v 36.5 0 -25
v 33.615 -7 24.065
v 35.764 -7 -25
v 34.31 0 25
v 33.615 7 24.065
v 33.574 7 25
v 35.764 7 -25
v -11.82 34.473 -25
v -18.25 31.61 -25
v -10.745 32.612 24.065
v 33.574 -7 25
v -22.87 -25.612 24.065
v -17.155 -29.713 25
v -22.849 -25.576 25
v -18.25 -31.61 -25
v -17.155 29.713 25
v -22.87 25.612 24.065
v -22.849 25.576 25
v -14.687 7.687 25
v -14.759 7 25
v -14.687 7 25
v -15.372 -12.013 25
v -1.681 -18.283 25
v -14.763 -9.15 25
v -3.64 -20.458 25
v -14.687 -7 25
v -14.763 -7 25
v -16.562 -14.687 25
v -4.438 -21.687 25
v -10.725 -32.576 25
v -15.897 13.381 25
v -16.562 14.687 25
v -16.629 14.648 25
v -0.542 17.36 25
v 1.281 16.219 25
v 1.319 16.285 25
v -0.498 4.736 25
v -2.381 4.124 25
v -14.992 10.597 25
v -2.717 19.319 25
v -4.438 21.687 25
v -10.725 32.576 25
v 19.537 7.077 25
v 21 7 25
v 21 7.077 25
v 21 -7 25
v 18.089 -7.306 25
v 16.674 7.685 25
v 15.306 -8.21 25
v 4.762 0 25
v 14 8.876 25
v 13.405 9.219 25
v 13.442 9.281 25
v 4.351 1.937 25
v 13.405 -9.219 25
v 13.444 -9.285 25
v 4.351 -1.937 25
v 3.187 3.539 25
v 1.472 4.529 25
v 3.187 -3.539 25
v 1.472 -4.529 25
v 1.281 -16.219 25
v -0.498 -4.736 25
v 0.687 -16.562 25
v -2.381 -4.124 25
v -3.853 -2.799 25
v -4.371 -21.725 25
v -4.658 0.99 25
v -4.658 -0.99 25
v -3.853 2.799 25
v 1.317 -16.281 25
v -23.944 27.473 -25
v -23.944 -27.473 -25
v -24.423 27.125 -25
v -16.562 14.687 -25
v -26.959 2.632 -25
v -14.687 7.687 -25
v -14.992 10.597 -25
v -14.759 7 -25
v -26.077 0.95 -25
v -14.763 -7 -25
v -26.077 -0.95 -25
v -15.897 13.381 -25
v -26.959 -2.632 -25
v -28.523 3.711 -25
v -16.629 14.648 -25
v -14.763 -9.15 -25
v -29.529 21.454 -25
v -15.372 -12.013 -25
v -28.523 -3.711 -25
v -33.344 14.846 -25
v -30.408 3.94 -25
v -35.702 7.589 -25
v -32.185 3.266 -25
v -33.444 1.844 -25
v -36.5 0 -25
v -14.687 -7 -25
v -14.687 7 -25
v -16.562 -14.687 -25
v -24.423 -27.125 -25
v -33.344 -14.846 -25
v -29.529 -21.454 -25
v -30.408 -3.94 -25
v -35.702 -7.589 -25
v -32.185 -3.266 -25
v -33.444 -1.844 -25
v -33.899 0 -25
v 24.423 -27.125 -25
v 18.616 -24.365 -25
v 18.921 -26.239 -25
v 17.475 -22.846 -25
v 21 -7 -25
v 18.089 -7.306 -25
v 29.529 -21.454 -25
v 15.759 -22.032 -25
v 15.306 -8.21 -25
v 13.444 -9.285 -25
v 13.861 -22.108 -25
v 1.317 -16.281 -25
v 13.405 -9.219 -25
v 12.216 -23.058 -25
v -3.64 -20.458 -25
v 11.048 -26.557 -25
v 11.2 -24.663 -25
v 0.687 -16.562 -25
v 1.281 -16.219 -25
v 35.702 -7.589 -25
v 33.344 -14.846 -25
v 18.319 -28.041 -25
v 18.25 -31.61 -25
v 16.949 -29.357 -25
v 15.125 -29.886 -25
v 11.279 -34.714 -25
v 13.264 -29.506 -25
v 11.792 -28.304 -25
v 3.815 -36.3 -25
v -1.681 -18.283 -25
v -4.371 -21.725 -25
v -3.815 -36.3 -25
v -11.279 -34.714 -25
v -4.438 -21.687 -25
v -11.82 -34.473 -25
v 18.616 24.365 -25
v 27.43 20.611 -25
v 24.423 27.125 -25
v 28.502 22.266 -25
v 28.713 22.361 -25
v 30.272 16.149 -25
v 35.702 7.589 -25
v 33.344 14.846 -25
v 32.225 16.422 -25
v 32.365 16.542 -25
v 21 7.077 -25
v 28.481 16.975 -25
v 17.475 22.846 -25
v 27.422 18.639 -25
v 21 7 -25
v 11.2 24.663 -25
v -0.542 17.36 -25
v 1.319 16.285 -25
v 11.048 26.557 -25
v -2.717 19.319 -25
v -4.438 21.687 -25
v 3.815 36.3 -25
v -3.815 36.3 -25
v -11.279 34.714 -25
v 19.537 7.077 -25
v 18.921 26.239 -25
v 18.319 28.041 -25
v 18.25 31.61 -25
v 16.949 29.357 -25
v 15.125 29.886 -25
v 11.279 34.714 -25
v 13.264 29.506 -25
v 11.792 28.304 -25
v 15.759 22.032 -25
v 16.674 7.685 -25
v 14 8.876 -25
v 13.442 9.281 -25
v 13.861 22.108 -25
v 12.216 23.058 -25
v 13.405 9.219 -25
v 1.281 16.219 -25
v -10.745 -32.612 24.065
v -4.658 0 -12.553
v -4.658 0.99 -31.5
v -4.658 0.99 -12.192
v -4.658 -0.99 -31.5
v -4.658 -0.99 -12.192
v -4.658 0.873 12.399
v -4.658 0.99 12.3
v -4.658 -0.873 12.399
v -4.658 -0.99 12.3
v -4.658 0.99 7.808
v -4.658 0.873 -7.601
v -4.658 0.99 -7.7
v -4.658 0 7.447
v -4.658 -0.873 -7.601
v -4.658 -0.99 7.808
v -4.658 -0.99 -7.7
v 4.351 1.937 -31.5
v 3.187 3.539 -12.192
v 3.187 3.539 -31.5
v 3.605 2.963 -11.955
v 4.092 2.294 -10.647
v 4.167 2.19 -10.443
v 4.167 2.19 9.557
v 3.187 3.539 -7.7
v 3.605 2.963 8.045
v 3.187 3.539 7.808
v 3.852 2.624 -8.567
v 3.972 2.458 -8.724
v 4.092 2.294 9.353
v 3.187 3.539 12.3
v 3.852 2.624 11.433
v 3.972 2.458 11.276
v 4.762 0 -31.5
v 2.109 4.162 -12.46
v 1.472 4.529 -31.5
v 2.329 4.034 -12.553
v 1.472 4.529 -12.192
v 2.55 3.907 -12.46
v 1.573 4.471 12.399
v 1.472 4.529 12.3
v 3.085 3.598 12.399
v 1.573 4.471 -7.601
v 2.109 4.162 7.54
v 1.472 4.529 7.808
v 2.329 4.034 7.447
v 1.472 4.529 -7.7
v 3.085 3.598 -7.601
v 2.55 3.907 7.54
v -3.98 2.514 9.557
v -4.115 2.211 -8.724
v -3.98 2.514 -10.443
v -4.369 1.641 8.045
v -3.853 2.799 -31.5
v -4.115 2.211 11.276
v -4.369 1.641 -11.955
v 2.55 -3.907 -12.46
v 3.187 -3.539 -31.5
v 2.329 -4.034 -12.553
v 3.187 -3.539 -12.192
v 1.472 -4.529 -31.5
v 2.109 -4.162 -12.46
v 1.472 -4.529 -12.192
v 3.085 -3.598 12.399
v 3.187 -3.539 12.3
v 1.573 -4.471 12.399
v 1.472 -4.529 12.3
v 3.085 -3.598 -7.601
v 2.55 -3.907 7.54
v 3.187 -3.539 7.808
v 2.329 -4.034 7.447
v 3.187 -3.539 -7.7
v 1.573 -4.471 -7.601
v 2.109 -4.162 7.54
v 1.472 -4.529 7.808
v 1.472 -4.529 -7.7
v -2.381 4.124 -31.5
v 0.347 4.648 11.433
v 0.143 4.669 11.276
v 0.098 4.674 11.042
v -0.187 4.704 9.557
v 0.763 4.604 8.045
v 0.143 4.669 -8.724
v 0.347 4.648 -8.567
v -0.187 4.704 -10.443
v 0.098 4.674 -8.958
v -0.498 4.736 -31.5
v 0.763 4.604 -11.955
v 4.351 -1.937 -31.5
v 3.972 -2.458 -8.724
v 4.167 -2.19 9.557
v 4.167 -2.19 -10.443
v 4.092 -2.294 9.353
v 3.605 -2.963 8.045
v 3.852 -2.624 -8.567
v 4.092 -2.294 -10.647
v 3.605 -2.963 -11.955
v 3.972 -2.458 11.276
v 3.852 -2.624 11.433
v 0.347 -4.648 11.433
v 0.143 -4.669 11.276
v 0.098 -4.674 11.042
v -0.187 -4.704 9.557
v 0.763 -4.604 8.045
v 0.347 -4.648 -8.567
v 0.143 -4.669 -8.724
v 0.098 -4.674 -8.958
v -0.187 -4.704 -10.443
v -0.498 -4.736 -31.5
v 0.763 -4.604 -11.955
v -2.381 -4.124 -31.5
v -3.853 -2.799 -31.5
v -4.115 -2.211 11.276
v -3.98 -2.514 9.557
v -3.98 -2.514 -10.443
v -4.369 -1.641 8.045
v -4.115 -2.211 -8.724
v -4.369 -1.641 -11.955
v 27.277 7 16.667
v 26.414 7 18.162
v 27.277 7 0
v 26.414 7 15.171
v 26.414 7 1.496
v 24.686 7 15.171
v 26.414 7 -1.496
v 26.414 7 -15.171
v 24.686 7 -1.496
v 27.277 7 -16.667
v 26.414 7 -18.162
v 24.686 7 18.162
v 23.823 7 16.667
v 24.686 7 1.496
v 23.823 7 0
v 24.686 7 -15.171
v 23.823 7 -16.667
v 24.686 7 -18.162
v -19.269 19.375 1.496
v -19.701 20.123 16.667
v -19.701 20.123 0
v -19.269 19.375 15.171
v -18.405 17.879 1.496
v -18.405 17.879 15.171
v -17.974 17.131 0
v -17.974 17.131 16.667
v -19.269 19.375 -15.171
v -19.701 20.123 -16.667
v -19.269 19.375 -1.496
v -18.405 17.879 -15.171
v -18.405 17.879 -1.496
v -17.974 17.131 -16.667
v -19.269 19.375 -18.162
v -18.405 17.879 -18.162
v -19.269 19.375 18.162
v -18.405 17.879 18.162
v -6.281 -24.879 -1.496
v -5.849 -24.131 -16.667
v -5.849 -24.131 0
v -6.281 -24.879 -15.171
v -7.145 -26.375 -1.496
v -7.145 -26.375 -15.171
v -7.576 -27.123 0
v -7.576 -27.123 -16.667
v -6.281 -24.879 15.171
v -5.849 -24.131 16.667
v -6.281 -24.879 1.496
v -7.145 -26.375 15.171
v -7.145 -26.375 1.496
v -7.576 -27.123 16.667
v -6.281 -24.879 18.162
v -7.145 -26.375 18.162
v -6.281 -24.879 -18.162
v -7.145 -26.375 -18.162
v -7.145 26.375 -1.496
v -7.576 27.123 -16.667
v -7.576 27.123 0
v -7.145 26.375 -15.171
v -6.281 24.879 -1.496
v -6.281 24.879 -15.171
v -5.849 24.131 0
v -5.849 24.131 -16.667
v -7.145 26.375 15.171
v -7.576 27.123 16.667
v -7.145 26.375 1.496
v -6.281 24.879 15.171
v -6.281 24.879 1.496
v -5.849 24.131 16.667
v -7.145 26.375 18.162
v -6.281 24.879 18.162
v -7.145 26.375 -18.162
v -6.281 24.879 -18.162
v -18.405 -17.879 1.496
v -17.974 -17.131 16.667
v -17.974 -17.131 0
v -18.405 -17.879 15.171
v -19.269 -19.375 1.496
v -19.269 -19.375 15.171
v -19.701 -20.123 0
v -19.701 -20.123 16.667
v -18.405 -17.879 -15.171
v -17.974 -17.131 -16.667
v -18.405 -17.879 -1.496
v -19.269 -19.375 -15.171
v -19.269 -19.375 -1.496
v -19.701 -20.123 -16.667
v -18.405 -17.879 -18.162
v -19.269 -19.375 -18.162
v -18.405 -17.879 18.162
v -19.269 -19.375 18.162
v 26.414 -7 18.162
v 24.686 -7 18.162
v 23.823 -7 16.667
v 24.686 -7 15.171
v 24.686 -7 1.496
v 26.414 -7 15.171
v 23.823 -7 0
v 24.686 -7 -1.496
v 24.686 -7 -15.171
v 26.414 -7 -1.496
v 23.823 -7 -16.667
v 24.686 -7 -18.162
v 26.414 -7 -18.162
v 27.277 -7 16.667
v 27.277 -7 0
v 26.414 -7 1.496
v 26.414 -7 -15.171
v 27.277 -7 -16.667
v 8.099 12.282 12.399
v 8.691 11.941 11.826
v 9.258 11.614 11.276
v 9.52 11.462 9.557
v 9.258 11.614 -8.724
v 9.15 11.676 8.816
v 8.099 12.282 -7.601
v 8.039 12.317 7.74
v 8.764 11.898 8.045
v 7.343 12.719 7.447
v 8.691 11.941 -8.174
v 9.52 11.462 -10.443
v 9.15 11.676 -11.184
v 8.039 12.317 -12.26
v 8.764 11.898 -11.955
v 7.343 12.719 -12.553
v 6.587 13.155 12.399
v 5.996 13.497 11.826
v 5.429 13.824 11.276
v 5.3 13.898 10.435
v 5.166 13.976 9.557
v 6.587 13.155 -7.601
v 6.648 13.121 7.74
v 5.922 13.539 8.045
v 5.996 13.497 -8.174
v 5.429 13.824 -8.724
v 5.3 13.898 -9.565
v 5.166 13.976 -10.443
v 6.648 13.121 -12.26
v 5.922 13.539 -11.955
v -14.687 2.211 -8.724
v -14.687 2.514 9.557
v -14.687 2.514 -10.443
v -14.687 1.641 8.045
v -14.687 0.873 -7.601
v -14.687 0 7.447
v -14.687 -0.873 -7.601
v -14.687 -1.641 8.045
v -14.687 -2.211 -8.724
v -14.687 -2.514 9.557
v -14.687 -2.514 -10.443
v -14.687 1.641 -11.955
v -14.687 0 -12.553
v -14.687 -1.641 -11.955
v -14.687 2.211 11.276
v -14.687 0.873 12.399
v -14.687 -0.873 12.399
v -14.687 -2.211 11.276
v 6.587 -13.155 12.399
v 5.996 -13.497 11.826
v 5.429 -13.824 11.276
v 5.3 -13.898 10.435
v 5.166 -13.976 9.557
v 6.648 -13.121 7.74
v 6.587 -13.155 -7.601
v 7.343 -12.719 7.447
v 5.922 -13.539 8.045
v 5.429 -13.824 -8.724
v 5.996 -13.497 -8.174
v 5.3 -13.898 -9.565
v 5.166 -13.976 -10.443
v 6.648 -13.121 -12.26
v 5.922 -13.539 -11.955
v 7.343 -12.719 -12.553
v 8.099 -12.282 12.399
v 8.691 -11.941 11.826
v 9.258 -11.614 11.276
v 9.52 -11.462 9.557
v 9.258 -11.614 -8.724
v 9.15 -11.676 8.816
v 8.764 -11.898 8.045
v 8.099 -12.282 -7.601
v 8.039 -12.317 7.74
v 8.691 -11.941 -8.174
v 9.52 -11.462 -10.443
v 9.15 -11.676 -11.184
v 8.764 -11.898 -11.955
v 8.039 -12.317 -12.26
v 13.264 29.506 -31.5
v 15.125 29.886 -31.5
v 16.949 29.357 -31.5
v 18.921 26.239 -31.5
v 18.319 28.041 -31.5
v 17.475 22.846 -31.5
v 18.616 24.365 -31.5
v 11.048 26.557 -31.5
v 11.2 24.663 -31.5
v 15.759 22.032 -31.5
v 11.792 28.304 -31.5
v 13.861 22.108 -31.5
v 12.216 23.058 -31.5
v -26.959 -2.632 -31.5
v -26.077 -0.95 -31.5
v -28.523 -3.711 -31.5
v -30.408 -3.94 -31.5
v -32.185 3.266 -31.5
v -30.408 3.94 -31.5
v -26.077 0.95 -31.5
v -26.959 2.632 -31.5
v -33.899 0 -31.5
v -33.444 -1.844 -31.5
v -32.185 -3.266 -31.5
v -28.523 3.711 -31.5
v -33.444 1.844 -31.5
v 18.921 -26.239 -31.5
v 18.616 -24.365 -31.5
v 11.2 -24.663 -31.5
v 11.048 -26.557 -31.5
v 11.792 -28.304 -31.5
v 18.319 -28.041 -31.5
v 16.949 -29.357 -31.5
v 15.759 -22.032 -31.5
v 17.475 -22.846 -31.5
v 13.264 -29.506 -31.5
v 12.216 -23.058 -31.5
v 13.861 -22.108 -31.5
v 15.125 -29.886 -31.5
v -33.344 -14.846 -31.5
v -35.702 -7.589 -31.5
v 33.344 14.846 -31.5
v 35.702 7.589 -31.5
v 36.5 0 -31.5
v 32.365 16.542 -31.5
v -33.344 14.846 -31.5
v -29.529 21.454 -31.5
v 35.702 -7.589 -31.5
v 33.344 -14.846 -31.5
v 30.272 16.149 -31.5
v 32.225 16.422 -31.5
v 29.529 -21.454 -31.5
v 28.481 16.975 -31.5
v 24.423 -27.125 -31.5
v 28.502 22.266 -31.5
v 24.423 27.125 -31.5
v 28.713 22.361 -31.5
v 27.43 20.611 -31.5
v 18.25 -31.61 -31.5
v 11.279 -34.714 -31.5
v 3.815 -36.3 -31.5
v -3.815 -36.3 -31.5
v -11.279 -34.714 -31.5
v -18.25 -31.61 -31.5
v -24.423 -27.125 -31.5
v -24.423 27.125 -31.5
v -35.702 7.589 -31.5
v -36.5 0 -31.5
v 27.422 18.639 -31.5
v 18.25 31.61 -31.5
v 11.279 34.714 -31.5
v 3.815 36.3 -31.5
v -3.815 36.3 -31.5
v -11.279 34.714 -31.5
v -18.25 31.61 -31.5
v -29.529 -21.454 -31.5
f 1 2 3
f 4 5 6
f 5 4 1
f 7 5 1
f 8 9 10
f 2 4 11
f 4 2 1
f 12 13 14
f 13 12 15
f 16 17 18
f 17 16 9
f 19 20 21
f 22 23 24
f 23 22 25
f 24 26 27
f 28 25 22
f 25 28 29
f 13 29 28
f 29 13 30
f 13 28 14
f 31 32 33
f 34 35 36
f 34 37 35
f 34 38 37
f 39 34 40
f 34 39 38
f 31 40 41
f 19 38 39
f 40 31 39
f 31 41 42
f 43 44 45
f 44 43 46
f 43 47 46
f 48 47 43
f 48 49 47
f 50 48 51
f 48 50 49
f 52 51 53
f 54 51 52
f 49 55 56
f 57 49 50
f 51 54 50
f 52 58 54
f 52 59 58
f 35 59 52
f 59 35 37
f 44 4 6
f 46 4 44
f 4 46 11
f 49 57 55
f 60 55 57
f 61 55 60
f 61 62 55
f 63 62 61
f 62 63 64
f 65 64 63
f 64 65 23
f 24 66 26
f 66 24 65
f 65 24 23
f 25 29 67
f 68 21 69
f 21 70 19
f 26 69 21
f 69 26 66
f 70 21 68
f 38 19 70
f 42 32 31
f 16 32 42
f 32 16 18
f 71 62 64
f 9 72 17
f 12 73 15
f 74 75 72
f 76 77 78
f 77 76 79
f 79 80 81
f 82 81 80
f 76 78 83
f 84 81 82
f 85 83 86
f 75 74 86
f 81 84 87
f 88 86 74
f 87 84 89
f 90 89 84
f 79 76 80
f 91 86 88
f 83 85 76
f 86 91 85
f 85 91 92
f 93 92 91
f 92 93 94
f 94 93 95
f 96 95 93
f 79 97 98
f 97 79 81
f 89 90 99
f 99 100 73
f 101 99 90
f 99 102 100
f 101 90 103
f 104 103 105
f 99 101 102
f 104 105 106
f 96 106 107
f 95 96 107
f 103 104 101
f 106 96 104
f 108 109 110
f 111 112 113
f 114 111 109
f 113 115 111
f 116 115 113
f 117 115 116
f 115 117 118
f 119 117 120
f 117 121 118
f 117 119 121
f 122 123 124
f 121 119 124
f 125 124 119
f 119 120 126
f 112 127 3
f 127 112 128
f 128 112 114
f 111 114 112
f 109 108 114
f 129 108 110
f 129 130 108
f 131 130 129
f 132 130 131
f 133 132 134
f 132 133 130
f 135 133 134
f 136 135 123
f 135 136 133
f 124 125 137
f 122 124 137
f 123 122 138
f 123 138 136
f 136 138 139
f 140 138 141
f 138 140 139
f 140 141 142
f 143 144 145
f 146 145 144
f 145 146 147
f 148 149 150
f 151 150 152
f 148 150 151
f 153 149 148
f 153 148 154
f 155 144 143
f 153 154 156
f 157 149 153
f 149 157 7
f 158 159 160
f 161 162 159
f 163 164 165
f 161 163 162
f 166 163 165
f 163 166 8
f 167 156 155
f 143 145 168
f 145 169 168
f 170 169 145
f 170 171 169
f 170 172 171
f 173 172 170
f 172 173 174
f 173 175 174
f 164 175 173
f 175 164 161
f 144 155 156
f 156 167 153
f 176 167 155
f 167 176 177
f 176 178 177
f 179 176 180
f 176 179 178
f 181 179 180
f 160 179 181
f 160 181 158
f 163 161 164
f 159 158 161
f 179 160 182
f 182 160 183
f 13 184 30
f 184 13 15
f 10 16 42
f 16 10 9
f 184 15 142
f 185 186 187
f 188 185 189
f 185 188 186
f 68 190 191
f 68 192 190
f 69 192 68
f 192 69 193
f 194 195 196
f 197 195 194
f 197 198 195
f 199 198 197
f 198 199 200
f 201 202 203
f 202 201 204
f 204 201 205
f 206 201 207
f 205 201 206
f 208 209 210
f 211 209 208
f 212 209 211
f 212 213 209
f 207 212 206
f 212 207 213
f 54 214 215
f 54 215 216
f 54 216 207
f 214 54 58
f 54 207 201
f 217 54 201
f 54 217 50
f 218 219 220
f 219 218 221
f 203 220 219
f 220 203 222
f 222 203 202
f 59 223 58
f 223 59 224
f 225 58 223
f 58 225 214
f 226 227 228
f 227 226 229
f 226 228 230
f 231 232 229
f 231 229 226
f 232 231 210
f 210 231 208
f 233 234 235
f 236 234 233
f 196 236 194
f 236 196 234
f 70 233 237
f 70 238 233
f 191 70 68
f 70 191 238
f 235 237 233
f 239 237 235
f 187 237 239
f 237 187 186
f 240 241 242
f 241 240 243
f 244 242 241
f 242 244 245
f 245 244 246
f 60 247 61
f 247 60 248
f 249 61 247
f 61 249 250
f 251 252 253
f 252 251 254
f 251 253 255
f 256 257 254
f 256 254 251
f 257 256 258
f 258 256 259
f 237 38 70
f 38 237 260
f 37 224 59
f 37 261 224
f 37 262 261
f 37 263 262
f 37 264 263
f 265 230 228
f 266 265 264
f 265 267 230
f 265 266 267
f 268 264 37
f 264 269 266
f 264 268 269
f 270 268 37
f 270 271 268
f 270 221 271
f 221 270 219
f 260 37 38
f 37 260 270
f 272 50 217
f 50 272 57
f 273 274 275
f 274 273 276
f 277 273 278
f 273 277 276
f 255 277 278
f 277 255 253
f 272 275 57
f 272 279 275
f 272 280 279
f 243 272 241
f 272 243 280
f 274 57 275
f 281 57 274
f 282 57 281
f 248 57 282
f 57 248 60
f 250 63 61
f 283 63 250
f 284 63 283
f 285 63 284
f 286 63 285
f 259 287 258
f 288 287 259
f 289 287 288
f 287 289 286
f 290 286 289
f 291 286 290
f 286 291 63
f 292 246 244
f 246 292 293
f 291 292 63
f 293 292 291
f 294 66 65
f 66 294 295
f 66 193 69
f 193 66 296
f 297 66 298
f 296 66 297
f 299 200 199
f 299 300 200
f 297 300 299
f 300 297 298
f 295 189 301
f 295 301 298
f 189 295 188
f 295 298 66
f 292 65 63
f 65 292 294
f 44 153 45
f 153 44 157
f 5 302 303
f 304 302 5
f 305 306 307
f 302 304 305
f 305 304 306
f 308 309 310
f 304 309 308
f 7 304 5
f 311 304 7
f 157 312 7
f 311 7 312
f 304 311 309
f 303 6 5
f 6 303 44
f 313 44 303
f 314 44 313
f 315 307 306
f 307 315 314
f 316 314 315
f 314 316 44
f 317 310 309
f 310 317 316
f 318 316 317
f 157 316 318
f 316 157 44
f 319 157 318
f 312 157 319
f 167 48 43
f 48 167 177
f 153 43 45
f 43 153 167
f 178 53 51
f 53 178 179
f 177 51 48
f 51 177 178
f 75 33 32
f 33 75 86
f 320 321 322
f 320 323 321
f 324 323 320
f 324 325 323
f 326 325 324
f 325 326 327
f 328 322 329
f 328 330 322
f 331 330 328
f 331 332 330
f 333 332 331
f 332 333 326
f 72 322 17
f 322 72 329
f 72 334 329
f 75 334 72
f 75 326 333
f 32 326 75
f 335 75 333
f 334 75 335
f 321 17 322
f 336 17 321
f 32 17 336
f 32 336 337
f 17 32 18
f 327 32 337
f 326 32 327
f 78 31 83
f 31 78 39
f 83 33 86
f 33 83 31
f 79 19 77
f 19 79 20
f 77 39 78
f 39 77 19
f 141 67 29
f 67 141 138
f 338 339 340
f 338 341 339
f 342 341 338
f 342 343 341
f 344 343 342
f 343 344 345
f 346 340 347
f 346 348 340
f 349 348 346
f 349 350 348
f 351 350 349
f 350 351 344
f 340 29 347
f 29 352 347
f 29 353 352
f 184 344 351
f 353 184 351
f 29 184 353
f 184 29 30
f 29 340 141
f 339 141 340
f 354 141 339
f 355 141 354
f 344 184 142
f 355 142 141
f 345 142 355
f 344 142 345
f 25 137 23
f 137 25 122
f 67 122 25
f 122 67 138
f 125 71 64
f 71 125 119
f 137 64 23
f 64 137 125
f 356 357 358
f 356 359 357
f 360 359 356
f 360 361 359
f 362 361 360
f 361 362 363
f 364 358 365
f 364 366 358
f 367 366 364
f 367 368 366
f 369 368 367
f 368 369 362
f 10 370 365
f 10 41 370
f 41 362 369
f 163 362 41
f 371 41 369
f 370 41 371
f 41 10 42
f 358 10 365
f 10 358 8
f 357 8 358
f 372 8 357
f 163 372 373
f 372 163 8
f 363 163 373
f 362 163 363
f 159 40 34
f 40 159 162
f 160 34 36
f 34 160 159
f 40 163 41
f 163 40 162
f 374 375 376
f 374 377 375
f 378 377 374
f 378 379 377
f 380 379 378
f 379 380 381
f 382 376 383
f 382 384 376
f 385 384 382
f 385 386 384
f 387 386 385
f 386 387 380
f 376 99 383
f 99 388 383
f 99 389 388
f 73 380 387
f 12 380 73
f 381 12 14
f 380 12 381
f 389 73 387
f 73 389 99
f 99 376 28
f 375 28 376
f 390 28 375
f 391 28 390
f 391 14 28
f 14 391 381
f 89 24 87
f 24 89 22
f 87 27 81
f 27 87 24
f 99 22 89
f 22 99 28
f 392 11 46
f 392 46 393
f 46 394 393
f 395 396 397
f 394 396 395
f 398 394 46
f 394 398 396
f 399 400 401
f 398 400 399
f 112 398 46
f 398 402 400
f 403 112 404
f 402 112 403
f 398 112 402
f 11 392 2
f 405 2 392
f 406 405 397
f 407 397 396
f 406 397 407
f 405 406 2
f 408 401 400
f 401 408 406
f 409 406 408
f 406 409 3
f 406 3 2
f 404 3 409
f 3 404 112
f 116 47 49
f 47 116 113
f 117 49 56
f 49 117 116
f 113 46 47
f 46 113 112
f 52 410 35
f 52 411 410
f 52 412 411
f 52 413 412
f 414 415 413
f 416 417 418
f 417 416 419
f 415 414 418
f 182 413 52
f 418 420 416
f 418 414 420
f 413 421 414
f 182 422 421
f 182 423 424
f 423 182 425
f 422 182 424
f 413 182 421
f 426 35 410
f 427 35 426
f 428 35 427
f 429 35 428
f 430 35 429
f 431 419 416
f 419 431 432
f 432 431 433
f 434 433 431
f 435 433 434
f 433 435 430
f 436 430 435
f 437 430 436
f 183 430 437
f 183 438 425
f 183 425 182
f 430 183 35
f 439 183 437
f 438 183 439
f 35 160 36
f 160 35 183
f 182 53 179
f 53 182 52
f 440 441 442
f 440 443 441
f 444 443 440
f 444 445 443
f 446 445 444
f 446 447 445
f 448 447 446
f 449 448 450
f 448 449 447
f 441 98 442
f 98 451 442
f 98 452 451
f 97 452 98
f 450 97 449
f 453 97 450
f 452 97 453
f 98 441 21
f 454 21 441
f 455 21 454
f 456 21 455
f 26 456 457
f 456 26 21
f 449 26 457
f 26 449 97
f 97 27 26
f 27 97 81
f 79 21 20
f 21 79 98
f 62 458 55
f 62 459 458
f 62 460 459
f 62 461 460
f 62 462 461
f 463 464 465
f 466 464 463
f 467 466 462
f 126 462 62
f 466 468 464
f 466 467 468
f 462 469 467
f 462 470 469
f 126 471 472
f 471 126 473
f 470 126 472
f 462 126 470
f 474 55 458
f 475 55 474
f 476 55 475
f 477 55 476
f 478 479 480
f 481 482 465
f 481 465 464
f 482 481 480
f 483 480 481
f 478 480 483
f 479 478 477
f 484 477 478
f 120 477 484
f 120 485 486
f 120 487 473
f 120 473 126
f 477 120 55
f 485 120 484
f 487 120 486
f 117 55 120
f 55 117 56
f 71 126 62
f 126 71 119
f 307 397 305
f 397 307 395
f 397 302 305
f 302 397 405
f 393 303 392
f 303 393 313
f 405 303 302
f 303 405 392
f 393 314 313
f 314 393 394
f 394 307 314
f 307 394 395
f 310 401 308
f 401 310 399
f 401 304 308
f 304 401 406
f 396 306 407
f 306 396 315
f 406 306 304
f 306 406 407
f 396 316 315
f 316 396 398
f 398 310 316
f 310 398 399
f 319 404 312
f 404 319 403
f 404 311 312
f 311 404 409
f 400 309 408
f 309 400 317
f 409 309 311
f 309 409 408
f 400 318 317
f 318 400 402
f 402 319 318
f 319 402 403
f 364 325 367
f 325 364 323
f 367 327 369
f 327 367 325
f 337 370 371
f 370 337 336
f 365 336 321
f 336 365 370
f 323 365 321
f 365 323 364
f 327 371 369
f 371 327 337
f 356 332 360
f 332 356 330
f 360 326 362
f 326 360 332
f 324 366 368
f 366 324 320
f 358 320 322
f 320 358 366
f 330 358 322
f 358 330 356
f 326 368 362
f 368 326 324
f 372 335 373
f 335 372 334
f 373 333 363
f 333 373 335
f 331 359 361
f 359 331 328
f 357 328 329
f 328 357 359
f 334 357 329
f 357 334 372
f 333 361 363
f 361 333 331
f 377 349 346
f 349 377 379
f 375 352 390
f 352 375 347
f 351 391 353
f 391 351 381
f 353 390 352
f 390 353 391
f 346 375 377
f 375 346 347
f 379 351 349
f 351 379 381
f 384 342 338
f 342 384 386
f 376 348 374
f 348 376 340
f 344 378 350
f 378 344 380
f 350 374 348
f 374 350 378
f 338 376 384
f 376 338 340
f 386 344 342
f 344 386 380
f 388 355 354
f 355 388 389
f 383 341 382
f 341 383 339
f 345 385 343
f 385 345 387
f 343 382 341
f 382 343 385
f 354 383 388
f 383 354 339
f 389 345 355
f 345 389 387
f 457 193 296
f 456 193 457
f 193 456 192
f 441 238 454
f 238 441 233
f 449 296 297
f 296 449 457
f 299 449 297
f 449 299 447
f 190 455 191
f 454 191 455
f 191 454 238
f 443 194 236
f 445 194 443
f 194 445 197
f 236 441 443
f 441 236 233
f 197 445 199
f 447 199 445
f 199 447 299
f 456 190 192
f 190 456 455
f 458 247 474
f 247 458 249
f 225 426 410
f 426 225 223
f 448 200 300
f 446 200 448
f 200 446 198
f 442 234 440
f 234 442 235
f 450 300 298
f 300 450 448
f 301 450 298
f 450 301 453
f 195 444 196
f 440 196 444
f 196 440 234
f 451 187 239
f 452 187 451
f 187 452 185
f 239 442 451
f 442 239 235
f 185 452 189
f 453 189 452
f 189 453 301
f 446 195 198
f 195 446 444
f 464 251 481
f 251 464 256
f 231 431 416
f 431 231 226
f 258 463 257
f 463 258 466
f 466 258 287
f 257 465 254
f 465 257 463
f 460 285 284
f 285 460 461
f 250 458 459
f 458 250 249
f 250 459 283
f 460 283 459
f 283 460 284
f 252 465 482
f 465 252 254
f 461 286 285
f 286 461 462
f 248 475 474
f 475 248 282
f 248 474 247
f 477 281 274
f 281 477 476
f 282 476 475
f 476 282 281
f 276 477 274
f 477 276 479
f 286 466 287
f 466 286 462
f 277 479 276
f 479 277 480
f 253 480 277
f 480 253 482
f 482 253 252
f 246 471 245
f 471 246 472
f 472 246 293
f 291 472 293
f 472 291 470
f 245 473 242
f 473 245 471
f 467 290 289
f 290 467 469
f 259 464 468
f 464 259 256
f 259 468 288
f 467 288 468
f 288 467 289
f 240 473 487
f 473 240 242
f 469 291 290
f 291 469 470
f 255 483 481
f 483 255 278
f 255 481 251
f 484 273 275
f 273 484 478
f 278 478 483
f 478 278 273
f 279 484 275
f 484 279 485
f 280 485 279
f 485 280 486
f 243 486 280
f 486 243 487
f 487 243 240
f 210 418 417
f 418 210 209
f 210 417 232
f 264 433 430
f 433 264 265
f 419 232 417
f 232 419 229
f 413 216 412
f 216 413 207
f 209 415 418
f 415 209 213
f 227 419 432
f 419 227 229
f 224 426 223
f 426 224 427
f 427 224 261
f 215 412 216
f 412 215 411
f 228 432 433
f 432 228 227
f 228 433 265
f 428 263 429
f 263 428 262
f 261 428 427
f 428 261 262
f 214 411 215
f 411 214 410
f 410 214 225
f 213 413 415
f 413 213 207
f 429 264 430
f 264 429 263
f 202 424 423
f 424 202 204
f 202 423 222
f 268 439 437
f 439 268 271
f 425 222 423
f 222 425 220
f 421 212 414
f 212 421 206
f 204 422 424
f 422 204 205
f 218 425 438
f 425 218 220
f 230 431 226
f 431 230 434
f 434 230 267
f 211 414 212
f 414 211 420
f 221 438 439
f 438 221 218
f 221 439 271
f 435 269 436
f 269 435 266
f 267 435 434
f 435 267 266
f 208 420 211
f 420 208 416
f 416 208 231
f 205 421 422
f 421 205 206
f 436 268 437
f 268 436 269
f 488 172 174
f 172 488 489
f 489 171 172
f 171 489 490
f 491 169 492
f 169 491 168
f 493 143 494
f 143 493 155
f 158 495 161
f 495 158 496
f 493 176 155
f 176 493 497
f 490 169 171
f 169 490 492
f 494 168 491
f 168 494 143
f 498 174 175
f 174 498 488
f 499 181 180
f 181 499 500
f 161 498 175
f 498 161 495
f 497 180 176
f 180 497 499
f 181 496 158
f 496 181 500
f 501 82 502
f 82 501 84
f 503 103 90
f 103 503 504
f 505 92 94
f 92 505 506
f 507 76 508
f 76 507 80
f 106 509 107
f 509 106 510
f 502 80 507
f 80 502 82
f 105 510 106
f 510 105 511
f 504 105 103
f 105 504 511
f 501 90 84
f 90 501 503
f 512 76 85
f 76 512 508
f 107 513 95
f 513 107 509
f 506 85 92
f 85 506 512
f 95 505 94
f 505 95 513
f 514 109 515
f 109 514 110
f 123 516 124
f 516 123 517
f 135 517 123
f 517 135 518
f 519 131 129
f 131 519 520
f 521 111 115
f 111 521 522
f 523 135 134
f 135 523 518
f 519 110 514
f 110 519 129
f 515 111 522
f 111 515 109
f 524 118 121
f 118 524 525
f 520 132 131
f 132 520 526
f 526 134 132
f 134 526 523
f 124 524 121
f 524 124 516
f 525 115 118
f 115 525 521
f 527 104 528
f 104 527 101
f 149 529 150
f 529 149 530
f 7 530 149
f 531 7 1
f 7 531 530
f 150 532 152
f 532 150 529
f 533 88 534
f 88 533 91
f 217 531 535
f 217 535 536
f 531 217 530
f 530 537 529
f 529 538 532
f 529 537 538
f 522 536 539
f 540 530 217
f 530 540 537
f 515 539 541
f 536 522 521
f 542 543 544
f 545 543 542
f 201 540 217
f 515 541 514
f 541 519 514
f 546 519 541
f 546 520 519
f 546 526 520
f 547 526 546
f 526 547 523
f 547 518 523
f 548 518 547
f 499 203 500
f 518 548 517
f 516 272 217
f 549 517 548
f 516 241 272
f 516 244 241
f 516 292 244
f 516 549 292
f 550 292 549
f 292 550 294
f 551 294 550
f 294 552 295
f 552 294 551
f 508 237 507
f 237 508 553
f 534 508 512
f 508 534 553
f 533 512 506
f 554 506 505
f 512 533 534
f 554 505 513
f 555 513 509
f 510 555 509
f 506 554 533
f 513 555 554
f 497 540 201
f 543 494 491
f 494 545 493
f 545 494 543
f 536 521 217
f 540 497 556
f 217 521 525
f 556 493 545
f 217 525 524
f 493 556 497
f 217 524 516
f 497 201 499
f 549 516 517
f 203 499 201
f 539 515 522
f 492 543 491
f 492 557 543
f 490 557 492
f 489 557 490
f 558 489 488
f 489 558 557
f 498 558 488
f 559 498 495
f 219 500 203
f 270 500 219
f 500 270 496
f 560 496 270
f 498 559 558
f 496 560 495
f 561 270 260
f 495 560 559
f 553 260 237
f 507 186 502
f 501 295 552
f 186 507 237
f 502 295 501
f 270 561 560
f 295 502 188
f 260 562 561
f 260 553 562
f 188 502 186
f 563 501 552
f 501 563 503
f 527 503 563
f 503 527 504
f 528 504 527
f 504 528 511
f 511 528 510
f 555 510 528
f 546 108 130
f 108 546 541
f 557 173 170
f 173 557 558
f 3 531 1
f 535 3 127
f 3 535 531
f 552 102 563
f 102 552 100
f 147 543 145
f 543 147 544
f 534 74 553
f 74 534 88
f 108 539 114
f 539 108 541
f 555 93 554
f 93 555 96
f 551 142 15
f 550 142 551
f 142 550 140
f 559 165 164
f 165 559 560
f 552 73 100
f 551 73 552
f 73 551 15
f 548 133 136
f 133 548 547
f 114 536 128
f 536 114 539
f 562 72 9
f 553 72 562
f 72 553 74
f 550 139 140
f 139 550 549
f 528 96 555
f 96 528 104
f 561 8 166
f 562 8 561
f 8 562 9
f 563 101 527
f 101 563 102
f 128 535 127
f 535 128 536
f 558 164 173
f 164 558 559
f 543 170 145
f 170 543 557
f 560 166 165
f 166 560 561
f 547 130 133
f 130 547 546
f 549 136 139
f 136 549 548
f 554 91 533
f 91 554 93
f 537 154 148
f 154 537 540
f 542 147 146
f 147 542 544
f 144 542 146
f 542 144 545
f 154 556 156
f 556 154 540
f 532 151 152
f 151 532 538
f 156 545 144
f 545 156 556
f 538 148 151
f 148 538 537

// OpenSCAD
// Base for Spider by 
// 12/14/2020
// Visit erellaz.com for additional documentation and workflow

scale=25.4;    // Inch to mm

//Main disk
dm=73; //External diameter mm
dc=35;
hm=50; //heigth  mm
conification=.94;//percentage of conification, making the top smaller than the base

//central hole
dh=(3/8)*(scale);//=9.5; //diameter hole for 3/8" screw, not tapped

// Notch
dnotch=7; //diameter notch in mm
rnotch=32.5; //positional angle of notch in degree


//holes for vanes
rlh=.1360*scale/2; //drill at .1360 to tap for 8-32 screws
//rlh=((0.089)*(scale))/2; //for 4-40 tap, drill at 0.089", closest fractional 3/32"=0.094"
nbrholes=3;
echo(rlh);
hlh=50; //height of assembly in mm
percvaneholes=.70;

//filet
fi=14; //this value in mm should be greater than vane_spacing

//spacing between 2 parallel vanes
vane_spacing=14; //we need to allo for 2 1/4" screws, so a little over 1/2 thickness, ie over 12.7mm
x=vane_spacing/2;


// The base
hb=6.5; //thickness of base mm
cs=3; //number of collimation screws, should be 3 or 4
rot=60; //rotation factor in degree
perc=.82; //percentage of the diameter to place the collimation holes
rlhb=(5/16)*(scale)/2;//7.9/2; //The holes in the base, 5/16", not tapped

//hole to axis
//holes
rha=.2010*scale/2;//for 1/4-20 tap, drill at 0.2010", closest fractional 13/64"


//Resolution for STL export only. That is for display in Openscad and 3D printing only. 
//Please do comment this before going to Freecad, or you will end up with inefficient facets.
// and will not play well with export to .step files
//$fn=250;

//_________________________________________________________________________________
//main body
module body(hm,dm){
difference(){
cylinder(h=hm, r1=.5*dm,r2=.5*conification*dm, center=true); //the body
//cube(size = [dm, dm, hm], center = true);
cylinder(h=hm+20, d=dh, center=true); //the hole
}
}

//The 3 cut outs of the main body
module cutter(dm,hm){
 for(i = [0 : 120 : 360]){
     //rotate([0,0,i]) translate([dm/6,0,-hm]) cube(size = [dm, dm, hm*2], center = false);
    rotate([0,0,i]) union(){
    translate([x,x+fi,-hm]) cube(size = [dm, dm, hm*2], center = false);
    translate([x+fi,x,-hm]) cube(size = [dm, dm, hm*2], center = false);
    translate([x+fi,x+fi,0]) cylinder(h=hm*2, r=fi, center=true);
    }
}

for(i = [30 : 120 : 390]){
     //rotate([0,0,i]) translate([dm/6,0,-hm]) cube(size = [dm, dm, hm*2], center = false);
    rotate([0,0,i]) union(){
    translate([x,x+fi,-hm]) cube(size = [dm, dm, hm*2], center = false);
    translate([x+fi,x,-hm]) cube(size = [dm, dm, hm*2], center = false);
    translate([x+fi,x+fi,0]) cylinder(h=hm*2, r=fi, center=true);
    }
}
// The following formula deserves a bit of explanation:
// the cylinders have their center on a circle of radius sqrt(2)*(x+fi)
// and 2 adjacent cylinders are 30 degrees apart
// hence the flat part should be at cos(15)*sqrt(2)*(x+fi)
for(i = [0 : 120 : 360]){
    rotate([0,0,i+60])translate([cos(15)*sqrt(2)*(x+fi),0,0])cube(size = [2*fi, fi, 1.2*hm], center = true);
}

}


//the holes to mount the vanes
module drill_holes(dm,hm,hlh,rlh){
   spacing=hm/(nbrholes*2);
    for(i = [0 : 120 : 360]){
    for(j = [0 : 1 : nbrholes-1]){
     rotate([0,0,i])  translate([percvaneholes*dm/2,0,(nbrholes-1-2*j)*spacing]) rotate([90,0,0]) cylinder(h=hlh, r=rlh, center=true);
    }
}
}

//the holes to the axis
module drill_holes_to_axis(hm,rha){
    for(i = [0 : 120 : 360]){
    rotate([0,0,i]) translate([-15,0,hm/5]) rotate([0,90,0]) cylinder(h=30, r=rha, center=true);
    rotate([0,0,i]) translate([-15,0,-hm/5]) rotate([0,90,0]) cylinder(h=30, r=rha, center=true);
    }
}

// The base for colimation screws
module collimation_base(hb,hm,dm,dh,rlh){
    difference(){
        translate([0,0,-(hb+hm)/2])cylinder(h=hb, d=dm, center=true);  //base body
        cylinder(h=hm+20, d=dh, center=true); //the hole
        for(i = [0 : 360/cs : 360]){ //the holes for collimation screw
         rotate([0,0,i+rot])  translate([perc*dm/2,0,0]) cylinder(h=4*hm, r=rlhb, center=true);   
        }
    }
}

// The notch to pass the secondary heater cables
module make_notch(dm,hm,dnotch,rnotch){
rotate([0,0,rnotch]) translate([(dm)/2,0,-hm/2]) cylinder(h=hm,d=dnotch, center=true);//the notch
}
//_________________________________________________________________________________
//build the body, remove the cut outs, drill the holes
union(){
    difference(){
        body(hm,dm);
        cutter(dm,hm);
        drill_holes(dm,hm,hlh,rlh);
        drill_holes_to_axis(hm,rha);
        }
    difference(){
        collimation_base(hb,hm,dm,dh);
        make_notch(dm,hm,dnotch,rnotch);
        }
}



//_________________________________________________________________________________
//Here we test the various parts individually
//_________________________________________________________________________________
//testing the cut out
if(0){
  color( "blue" ) {
      //for(i = [25 : 60 : 60]){
         rotate([0,0,60])translate([cos(15)*sqrt(2)*(x+fi),0,0])cube(size = [2*fi, fi, 1.2*hm], center = true);
  }
  //}
}

//_________________________________________________________________________________
//testing the cylinders
if(0){
  color( "red" ) {
      for(i = [0 : 30 : 30]){
      rotate([0,0,i]) translate([x+fi,x+fi,0]) cylinder(h=hm*1.4, r=fi, center=true);
      }
  }
    
}
//_________________________________________________________________________________
//testing the notch
if(0){
  color( "green" ) {
  make_notch(dm,hm,dnotch,rnotch);
      }  
}
